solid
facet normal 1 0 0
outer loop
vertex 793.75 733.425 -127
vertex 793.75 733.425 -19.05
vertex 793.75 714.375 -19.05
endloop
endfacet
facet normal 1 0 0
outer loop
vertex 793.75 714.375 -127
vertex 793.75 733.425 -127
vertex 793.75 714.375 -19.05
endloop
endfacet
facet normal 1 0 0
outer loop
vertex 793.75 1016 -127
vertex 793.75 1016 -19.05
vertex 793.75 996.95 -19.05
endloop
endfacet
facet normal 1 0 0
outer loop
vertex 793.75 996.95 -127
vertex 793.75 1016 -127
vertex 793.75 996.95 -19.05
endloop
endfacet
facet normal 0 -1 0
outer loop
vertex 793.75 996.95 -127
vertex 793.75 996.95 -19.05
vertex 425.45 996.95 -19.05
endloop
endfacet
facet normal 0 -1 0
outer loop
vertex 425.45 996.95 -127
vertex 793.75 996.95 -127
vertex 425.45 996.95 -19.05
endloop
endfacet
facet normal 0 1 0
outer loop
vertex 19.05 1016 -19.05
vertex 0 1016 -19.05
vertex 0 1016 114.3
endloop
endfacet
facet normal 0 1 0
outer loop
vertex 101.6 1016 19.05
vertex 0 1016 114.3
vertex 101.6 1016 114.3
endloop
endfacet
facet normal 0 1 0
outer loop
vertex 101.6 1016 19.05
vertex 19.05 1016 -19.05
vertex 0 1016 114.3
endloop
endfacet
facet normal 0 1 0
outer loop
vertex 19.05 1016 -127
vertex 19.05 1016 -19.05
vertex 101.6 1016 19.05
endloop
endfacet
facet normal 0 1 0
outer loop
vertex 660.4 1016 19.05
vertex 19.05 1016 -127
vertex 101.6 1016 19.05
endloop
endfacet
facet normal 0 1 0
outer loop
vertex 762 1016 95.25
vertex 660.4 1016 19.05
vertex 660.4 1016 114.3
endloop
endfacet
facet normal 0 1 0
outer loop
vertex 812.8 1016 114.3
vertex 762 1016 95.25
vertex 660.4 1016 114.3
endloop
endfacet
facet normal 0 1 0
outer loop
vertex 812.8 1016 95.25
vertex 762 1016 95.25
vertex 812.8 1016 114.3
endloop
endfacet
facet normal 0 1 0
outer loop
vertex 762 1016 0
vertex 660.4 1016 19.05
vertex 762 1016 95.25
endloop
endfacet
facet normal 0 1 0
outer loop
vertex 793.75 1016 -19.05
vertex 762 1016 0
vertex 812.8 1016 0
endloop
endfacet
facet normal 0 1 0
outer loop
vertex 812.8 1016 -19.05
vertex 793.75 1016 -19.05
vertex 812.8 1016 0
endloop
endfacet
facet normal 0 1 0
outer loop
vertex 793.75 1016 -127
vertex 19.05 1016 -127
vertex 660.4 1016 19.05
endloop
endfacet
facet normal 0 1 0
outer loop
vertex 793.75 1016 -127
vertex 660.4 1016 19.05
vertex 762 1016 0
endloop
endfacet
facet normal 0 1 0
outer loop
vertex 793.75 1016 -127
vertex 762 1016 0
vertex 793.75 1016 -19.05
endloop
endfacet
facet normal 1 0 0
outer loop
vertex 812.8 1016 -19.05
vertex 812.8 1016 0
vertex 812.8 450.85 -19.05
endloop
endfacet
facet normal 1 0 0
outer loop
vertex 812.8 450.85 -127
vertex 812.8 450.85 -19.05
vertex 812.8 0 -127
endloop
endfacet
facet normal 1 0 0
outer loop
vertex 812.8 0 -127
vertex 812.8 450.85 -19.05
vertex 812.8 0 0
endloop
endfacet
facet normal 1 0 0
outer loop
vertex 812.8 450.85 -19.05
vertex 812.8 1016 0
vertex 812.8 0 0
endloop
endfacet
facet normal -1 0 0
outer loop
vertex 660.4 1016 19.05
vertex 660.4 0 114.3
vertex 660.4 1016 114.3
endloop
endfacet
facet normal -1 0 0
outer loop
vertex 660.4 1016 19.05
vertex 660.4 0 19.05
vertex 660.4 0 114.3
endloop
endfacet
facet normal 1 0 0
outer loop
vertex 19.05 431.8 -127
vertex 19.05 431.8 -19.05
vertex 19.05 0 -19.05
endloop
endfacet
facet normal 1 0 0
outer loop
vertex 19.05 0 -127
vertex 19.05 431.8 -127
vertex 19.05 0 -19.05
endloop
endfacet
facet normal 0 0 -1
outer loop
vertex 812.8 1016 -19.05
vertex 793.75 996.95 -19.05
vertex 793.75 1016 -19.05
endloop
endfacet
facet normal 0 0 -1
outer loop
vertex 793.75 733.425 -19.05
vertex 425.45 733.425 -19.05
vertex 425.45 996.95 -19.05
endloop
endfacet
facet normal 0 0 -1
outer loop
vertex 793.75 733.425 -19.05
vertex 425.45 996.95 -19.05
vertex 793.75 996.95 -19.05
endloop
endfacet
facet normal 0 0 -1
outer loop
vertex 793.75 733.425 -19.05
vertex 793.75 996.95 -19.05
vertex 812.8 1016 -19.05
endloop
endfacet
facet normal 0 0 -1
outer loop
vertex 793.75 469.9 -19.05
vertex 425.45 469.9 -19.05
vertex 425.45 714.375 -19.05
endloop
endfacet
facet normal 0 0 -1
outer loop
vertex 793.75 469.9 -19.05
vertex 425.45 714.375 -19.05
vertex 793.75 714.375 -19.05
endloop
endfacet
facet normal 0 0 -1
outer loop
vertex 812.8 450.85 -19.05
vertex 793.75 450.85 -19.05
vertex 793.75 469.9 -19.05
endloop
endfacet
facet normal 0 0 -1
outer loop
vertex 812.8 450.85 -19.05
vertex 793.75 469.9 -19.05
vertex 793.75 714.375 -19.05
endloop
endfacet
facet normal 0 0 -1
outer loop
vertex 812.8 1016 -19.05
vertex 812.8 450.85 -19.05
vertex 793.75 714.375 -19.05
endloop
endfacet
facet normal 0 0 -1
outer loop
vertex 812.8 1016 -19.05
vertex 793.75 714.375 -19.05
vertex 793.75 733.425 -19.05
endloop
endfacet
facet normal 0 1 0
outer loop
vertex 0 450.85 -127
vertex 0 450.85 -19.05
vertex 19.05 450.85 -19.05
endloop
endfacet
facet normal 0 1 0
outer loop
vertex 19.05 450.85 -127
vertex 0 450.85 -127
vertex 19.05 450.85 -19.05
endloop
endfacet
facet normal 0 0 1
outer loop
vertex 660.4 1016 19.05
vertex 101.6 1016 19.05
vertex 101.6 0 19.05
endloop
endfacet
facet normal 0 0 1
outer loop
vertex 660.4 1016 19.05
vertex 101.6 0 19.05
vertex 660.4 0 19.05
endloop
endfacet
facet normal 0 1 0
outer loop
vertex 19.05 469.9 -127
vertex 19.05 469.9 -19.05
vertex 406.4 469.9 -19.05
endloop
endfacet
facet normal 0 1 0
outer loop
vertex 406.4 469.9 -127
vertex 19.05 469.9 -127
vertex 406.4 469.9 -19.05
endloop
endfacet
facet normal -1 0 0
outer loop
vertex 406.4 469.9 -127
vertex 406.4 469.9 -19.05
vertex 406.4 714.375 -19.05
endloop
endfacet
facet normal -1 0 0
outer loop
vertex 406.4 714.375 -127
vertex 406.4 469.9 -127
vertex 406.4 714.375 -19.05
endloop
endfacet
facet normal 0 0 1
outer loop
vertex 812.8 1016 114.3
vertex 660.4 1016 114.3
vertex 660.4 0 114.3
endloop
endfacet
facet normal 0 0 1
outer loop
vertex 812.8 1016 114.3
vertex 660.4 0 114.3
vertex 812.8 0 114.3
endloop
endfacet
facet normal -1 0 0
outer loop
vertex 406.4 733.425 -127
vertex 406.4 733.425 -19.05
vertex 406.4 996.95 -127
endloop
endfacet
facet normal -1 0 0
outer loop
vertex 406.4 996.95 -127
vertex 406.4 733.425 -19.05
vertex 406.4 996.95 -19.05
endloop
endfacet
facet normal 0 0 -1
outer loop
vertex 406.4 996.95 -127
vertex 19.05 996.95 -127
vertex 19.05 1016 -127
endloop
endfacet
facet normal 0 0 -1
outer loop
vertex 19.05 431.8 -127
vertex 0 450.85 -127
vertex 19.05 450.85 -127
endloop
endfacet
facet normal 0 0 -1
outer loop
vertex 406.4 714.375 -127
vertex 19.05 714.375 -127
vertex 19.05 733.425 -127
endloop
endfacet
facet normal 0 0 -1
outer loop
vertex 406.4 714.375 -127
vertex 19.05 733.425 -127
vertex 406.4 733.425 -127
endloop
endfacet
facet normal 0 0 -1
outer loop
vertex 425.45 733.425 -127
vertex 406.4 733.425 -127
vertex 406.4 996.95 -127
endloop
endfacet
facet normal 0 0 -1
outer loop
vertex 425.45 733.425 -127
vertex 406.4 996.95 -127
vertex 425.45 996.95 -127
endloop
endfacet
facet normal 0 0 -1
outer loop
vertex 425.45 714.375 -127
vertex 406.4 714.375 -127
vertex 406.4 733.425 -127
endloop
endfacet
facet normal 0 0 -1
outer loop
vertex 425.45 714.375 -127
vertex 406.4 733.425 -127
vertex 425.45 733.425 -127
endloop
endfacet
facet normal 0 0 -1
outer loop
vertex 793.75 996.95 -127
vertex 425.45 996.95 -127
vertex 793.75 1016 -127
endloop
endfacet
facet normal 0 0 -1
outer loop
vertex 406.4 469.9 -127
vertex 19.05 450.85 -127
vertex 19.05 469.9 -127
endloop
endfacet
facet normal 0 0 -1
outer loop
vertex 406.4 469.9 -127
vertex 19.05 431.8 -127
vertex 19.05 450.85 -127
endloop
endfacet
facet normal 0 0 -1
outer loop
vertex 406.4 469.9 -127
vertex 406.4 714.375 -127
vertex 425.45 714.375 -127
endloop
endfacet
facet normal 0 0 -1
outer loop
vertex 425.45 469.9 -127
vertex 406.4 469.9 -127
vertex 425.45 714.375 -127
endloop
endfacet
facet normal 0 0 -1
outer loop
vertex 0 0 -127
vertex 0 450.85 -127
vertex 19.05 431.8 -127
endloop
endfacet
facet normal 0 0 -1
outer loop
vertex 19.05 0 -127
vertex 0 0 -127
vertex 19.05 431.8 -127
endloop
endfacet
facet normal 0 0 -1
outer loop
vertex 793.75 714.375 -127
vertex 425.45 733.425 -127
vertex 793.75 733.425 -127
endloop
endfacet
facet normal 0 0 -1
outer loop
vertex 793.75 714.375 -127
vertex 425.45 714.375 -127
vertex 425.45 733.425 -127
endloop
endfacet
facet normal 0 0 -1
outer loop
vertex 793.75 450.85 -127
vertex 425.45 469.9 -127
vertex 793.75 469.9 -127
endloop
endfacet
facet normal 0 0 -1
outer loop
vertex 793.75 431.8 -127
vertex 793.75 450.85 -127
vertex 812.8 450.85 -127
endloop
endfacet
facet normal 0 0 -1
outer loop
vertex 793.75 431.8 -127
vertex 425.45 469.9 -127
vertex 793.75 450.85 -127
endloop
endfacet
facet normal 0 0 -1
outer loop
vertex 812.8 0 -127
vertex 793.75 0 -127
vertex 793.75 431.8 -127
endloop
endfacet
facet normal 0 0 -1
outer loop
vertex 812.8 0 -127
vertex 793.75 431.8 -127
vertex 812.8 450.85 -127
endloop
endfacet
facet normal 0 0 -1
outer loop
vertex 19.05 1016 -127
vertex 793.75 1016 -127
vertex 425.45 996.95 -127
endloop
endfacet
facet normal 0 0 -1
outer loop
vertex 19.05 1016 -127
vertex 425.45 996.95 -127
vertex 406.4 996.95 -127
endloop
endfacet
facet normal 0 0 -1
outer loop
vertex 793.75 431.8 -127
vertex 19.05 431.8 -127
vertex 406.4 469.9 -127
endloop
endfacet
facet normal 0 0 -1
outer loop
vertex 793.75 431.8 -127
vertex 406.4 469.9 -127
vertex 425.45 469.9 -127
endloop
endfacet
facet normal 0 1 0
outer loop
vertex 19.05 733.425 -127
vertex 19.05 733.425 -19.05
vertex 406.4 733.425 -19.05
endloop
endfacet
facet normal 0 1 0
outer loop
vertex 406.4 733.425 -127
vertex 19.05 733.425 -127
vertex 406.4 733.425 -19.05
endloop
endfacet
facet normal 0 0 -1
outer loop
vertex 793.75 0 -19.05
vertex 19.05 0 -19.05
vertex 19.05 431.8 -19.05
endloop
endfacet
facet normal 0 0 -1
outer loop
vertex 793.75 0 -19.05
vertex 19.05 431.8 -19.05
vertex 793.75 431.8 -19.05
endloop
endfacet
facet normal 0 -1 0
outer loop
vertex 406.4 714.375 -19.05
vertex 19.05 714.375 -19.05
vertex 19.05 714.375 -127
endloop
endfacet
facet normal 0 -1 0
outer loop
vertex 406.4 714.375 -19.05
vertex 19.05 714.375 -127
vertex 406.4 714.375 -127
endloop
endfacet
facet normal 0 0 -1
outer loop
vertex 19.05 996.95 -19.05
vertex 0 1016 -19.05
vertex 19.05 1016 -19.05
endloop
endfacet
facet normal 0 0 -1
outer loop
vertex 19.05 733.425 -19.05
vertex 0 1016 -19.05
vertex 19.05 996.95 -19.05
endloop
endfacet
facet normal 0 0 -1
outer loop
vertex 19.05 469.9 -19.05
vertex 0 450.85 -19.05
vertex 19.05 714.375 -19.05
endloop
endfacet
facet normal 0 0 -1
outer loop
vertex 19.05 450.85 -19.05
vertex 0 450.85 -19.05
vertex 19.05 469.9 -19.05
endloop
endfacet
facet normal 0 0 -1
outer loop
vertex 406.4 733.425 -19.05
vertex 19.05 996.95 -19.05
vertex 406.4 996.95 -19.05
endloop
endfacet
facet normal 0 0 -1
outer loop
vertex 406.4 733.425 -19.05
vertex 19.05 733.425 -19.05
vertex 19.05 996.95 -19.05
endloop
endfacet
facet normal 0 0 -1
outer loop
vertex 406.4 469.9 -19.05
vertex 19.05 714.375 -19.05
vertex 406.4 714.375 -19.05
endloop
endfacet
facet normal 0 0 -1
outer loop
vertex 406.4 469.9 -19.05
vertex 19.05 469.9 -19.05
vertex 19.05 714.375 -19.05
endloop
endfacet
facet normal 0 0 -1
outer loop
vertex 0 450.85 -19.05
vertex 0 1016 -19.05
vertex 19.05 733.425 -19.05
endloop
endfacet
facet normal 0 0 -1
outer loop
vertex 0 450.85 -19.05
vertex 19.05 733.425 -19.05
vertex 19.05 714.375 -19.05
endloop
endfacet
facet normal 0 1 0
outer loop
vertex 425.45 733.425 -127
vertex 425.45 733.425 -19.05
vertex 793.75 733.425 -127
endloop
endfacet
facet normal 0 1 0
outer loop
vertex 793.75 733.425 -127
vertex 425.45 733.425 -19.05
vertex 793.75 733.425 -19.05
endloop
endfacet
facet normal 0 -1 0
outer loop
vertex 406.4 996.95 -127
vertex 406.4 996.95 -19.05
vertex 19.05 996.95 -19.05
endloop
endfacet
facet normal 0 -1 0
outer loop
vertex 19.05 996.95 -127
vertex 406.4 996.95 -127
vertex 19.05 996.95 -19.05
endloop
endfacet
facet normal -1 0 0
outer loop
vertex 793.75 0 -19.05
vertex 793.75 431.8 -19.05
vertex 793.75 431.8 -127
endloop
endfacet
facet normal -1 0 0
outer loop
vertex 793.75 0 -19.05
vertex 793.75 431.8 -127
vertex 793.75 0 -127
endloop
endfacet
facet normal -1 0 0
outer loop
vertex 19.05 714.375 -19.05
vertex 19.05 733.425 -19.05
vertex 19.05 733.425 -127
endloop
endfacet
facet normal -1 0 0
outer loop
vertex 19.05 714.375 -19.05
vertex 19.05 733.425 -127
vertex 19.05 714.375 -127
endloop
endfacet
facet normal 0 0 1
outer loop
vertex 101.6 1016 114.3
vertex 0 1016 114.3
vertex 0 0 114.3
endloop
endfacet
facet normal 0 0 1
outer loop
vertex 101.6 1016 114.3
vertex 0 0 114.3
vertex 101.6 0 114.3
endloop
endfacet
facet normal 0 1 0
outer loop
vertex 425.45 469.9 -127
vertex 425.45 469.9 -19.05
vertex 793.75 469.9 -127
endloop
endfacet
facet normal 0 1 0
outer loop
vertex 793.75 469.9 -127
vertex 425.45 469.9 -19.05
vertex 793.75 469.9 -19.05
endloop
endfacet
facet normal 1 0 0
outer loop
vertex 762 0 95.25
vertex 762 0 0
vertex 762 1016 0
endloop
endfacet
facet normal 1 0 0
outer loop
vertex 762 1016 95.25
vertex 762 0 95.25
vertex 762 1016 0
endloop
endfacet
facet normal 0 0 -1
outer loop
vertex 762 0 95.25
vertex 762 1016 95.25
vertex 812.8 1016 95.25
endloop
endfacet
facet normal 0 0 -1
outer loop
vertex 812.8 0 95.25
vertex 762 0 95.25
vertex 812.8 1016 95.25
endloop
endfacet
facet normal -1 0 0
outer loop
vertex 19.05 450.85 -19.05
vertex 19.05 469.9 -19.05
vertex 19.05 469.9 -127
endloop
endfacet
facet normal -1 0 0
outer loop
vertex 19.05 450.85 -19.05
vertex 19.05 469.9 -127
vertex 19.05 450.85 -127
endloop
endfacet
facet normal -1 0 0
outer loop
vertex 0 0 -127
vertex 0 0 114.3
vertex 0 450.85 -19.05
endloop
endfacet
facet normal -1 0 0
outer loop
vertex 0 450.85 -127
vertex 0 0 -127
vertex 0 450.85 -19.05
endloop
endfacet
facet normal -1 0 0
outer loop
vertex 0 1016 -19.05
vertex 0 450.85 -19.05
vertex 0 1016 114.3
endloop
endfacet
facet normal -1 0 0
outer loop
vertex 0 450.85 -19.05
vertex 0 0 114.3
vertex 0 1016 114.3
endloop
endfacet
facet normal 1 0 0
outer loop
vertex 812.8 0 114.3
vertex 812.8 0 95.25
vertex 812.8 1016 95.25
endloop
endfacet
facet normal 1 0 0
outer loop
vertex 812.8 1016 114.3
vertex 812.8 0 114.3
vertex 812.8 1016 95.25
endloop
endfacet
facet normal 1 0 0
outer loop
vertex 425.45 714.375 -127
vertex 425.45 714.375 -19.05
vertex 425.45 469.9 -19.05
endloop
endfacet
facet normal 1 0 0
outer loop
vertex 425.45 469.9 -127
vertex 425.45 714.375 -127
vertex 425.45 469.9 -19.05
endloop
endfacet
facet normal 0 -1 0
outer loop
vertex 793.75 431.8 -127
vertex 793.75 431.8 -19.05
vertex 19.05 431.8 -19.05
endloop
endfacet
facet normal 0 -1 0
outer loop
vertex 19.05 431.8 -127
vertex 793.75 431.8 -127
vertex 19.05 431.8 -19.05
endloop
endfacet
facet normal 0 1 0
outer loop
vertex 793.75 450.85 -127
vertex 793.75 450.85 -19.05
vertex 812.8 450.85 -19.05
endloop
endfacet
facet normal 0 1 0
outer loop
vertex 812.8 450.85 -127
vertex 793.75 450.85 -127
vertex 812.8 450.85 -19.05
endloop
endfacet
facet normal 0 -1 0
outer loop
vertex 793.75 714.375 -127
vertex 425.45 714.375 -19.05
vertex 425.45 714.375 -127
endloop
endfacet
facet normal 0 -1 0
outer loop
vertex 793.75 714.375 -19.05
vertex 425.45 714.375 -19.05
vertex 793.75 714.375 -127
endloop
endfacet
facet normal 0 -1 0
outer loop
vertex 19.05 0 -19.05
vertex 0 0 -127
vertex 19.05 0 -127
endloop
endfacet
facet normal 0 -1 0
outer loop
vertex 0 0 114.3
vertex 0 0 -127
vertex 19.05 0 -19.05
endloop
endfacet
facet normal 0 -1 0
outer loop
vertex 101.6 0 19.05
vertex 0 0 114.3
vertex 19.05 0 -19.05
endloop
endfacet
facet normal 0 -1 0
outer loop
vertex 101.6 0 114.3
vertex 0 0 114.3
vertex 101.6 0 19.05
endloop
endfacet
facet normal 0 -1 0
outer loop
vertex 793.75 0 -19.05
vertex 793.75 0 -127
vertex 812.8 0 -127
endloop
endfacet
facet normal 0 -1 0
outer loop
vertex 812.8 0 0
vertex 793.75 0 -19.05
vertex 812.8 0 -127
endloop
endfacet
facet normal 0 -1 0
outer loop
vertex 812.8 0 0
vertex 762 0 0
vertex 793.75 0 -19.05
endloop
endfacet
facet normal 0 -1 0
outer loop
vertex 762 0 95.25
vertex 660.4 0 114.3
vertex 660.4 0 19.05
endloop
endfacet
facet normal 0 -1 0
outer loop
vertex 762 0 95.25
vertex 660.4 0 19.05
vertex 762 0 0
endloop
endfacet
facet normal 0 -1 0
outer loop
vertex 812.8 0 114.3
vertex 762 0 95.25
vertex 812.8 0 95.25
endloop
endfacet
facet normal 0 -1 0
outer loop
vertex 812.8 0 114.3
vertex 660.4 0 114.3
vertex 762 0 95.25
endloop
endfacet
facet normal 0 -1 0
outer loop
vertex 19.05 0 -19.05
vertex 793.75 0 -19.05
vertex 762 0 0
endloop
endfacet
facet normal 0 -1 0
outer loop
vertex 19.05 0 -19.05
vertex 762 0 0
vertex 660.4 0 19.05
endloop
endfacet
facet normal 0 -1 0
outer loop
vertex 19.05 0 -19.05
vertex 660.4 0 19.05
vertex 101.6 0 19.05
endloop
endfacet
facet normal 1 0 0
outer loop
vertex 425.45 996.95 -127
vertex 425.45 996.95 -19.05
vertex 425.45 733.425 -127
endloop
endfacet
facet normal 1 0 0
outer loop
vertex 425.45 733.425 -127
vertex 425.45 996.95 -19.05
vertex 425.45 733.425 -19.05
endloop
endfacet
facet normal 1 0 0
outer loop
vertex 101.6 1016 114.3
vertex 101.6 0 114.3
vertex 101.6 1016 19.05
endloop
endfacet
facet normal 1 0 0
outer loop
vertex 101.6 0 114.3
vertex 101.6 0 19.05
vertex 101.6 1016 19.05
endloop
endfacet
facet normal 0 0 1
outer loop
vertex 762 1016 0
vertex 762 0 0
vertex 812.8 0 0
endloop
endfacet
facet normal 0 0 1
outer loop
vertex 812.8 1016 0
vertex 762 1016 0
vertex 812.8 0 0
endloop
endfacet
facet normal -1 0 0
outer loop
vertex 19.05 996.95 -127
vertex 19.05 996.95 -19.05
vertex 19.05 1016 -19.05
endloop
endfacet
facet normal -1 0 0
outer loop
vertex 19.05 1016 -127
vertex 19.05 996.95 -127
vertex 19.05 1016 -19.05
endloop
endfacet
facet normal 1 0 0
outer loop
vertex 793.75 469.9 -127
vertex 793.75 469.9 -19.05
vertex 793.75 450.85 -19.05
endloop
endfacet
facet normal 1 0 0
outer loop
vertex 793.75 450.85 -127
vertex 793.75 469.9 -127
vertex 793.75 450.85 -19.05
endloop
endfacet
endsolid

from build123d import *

# Parameters (mm, degrees)
F0_W      = 762
F0_H      = 1016
F1_DEPTH  = 19.05
F2_W      = 101.6
F2_H      = 1016
F3_DEPTH  = 76.2
F4_W      = 152.4
F4_H      = 1016
F5_DEPTH  = 19.05
F6_W      = 812.8
F6_H      = 1016
F7_DEPTH  = 19.05
F8_W      = 101.6
F8_H      = 1016
F9_DEPTH  = 19.05
F10_W     = 19.05
F10_H     = 431.8
F10_W_2   = 387.35
F10_H_2   = 19.05
F10_W_3   = 368.3
F11_DEPTH = 107.95


with BuildPart() as f1:
    # F0 (on Top) → F1 (new body)
    with BuildSketch(Plane.XY):
        with Locations((381, 508)):
            Rectangle(F0_W, F0_H)
    extrude(amount=F1_DEPTH)

    # F2 (on face) → F3 (join)
    with BuildSketch(Plane.XY.offset(19.05)):
        with Locations((50.8, 508)):
            Rectangle(F2_W, F2_H)
        with Locations((711.2, 508)):
            Rectangle(F2_W, F2_H)
    extrude(amount=F3_DEPTH)

    # F4 (on face) → F5 (join)
    with BuildSketch(Plane.XY.offset(95.25)):
        with Locations((736.6, 508)):
            Rectangle(F4_W, F4_H)
    extrude(amount=F5_DEPTH)

    # F6 (on face) → F7 (join)
    with BuildSketch(Plane(origin=(0, 0, 0), x_dir=(1, 0, 0), z_dir=(0, 0, -1))):
        with Locations((406.4, -508)):
            Rectangle(F6_W, F6_H)
    extrude(amount=F7_DEPTH)

    # F8 (on face) → F9 (join)
    with BuildSketch(Plane.XY.offset(95.25)):
        with Locations((50.8, 508)):
            Rectangle(F8_W, F8_H)
    extrude(amount=F9_DEPTH)

    # F10 (on face) → F11 (join)
    with BuildSketch(Plane(origin=(0, 0, -19.05), x_dir=(1, 0, 0), z_dir=(0, 0, -1))):
        with Locations((9.525, -215.9)):
            Rectangle(F10_W, F10_H)
        Polygon((19.05, -431.8), (0, -431.8), (0, -450.85), (19.05, -450.85), (406.4, -450.85), (425.45, -450.85), (793.75, -450.85), (812.8, -450.85), (812.8, -431.8), (793.75, -431.8), align=None)
        with Locations((803.275, -215.9)):
            Rectangle(F10_W, F10_H)
        with Locations((212.725, -460.375)):
            Rectangle(F10_W_2, F10_H_2)
        Polygon((425.45, -450.85), (406.4, -450.85), (406.4, -469.9), (406.4, -714.375), (406.4, -733.425), (406.4, -996.95), (425.45, -996.95), (425.45, -733.425), (425.45, -714.375), (425.45, -469.9), align=None)
        with Locations((609.6, -460.375)):
            Rectangle(F10_W_3, F10_H_2)
        with Locations((212.725, -723.9)):
            Rectangle(F10_W_2, F10_H_2)
        with Locations((609.6, -723.9)):
            Rectangle(F10_W_3, F10_H_2)
        Polygon((425.45, -996.95), (406.4, -996.95), (19.05, -996.95), (19.05, -1016), (793.75, -1016), (793.75, -996.95), align=None)
    extrude(amount=F11_DEPTH)


solid = f1.part
